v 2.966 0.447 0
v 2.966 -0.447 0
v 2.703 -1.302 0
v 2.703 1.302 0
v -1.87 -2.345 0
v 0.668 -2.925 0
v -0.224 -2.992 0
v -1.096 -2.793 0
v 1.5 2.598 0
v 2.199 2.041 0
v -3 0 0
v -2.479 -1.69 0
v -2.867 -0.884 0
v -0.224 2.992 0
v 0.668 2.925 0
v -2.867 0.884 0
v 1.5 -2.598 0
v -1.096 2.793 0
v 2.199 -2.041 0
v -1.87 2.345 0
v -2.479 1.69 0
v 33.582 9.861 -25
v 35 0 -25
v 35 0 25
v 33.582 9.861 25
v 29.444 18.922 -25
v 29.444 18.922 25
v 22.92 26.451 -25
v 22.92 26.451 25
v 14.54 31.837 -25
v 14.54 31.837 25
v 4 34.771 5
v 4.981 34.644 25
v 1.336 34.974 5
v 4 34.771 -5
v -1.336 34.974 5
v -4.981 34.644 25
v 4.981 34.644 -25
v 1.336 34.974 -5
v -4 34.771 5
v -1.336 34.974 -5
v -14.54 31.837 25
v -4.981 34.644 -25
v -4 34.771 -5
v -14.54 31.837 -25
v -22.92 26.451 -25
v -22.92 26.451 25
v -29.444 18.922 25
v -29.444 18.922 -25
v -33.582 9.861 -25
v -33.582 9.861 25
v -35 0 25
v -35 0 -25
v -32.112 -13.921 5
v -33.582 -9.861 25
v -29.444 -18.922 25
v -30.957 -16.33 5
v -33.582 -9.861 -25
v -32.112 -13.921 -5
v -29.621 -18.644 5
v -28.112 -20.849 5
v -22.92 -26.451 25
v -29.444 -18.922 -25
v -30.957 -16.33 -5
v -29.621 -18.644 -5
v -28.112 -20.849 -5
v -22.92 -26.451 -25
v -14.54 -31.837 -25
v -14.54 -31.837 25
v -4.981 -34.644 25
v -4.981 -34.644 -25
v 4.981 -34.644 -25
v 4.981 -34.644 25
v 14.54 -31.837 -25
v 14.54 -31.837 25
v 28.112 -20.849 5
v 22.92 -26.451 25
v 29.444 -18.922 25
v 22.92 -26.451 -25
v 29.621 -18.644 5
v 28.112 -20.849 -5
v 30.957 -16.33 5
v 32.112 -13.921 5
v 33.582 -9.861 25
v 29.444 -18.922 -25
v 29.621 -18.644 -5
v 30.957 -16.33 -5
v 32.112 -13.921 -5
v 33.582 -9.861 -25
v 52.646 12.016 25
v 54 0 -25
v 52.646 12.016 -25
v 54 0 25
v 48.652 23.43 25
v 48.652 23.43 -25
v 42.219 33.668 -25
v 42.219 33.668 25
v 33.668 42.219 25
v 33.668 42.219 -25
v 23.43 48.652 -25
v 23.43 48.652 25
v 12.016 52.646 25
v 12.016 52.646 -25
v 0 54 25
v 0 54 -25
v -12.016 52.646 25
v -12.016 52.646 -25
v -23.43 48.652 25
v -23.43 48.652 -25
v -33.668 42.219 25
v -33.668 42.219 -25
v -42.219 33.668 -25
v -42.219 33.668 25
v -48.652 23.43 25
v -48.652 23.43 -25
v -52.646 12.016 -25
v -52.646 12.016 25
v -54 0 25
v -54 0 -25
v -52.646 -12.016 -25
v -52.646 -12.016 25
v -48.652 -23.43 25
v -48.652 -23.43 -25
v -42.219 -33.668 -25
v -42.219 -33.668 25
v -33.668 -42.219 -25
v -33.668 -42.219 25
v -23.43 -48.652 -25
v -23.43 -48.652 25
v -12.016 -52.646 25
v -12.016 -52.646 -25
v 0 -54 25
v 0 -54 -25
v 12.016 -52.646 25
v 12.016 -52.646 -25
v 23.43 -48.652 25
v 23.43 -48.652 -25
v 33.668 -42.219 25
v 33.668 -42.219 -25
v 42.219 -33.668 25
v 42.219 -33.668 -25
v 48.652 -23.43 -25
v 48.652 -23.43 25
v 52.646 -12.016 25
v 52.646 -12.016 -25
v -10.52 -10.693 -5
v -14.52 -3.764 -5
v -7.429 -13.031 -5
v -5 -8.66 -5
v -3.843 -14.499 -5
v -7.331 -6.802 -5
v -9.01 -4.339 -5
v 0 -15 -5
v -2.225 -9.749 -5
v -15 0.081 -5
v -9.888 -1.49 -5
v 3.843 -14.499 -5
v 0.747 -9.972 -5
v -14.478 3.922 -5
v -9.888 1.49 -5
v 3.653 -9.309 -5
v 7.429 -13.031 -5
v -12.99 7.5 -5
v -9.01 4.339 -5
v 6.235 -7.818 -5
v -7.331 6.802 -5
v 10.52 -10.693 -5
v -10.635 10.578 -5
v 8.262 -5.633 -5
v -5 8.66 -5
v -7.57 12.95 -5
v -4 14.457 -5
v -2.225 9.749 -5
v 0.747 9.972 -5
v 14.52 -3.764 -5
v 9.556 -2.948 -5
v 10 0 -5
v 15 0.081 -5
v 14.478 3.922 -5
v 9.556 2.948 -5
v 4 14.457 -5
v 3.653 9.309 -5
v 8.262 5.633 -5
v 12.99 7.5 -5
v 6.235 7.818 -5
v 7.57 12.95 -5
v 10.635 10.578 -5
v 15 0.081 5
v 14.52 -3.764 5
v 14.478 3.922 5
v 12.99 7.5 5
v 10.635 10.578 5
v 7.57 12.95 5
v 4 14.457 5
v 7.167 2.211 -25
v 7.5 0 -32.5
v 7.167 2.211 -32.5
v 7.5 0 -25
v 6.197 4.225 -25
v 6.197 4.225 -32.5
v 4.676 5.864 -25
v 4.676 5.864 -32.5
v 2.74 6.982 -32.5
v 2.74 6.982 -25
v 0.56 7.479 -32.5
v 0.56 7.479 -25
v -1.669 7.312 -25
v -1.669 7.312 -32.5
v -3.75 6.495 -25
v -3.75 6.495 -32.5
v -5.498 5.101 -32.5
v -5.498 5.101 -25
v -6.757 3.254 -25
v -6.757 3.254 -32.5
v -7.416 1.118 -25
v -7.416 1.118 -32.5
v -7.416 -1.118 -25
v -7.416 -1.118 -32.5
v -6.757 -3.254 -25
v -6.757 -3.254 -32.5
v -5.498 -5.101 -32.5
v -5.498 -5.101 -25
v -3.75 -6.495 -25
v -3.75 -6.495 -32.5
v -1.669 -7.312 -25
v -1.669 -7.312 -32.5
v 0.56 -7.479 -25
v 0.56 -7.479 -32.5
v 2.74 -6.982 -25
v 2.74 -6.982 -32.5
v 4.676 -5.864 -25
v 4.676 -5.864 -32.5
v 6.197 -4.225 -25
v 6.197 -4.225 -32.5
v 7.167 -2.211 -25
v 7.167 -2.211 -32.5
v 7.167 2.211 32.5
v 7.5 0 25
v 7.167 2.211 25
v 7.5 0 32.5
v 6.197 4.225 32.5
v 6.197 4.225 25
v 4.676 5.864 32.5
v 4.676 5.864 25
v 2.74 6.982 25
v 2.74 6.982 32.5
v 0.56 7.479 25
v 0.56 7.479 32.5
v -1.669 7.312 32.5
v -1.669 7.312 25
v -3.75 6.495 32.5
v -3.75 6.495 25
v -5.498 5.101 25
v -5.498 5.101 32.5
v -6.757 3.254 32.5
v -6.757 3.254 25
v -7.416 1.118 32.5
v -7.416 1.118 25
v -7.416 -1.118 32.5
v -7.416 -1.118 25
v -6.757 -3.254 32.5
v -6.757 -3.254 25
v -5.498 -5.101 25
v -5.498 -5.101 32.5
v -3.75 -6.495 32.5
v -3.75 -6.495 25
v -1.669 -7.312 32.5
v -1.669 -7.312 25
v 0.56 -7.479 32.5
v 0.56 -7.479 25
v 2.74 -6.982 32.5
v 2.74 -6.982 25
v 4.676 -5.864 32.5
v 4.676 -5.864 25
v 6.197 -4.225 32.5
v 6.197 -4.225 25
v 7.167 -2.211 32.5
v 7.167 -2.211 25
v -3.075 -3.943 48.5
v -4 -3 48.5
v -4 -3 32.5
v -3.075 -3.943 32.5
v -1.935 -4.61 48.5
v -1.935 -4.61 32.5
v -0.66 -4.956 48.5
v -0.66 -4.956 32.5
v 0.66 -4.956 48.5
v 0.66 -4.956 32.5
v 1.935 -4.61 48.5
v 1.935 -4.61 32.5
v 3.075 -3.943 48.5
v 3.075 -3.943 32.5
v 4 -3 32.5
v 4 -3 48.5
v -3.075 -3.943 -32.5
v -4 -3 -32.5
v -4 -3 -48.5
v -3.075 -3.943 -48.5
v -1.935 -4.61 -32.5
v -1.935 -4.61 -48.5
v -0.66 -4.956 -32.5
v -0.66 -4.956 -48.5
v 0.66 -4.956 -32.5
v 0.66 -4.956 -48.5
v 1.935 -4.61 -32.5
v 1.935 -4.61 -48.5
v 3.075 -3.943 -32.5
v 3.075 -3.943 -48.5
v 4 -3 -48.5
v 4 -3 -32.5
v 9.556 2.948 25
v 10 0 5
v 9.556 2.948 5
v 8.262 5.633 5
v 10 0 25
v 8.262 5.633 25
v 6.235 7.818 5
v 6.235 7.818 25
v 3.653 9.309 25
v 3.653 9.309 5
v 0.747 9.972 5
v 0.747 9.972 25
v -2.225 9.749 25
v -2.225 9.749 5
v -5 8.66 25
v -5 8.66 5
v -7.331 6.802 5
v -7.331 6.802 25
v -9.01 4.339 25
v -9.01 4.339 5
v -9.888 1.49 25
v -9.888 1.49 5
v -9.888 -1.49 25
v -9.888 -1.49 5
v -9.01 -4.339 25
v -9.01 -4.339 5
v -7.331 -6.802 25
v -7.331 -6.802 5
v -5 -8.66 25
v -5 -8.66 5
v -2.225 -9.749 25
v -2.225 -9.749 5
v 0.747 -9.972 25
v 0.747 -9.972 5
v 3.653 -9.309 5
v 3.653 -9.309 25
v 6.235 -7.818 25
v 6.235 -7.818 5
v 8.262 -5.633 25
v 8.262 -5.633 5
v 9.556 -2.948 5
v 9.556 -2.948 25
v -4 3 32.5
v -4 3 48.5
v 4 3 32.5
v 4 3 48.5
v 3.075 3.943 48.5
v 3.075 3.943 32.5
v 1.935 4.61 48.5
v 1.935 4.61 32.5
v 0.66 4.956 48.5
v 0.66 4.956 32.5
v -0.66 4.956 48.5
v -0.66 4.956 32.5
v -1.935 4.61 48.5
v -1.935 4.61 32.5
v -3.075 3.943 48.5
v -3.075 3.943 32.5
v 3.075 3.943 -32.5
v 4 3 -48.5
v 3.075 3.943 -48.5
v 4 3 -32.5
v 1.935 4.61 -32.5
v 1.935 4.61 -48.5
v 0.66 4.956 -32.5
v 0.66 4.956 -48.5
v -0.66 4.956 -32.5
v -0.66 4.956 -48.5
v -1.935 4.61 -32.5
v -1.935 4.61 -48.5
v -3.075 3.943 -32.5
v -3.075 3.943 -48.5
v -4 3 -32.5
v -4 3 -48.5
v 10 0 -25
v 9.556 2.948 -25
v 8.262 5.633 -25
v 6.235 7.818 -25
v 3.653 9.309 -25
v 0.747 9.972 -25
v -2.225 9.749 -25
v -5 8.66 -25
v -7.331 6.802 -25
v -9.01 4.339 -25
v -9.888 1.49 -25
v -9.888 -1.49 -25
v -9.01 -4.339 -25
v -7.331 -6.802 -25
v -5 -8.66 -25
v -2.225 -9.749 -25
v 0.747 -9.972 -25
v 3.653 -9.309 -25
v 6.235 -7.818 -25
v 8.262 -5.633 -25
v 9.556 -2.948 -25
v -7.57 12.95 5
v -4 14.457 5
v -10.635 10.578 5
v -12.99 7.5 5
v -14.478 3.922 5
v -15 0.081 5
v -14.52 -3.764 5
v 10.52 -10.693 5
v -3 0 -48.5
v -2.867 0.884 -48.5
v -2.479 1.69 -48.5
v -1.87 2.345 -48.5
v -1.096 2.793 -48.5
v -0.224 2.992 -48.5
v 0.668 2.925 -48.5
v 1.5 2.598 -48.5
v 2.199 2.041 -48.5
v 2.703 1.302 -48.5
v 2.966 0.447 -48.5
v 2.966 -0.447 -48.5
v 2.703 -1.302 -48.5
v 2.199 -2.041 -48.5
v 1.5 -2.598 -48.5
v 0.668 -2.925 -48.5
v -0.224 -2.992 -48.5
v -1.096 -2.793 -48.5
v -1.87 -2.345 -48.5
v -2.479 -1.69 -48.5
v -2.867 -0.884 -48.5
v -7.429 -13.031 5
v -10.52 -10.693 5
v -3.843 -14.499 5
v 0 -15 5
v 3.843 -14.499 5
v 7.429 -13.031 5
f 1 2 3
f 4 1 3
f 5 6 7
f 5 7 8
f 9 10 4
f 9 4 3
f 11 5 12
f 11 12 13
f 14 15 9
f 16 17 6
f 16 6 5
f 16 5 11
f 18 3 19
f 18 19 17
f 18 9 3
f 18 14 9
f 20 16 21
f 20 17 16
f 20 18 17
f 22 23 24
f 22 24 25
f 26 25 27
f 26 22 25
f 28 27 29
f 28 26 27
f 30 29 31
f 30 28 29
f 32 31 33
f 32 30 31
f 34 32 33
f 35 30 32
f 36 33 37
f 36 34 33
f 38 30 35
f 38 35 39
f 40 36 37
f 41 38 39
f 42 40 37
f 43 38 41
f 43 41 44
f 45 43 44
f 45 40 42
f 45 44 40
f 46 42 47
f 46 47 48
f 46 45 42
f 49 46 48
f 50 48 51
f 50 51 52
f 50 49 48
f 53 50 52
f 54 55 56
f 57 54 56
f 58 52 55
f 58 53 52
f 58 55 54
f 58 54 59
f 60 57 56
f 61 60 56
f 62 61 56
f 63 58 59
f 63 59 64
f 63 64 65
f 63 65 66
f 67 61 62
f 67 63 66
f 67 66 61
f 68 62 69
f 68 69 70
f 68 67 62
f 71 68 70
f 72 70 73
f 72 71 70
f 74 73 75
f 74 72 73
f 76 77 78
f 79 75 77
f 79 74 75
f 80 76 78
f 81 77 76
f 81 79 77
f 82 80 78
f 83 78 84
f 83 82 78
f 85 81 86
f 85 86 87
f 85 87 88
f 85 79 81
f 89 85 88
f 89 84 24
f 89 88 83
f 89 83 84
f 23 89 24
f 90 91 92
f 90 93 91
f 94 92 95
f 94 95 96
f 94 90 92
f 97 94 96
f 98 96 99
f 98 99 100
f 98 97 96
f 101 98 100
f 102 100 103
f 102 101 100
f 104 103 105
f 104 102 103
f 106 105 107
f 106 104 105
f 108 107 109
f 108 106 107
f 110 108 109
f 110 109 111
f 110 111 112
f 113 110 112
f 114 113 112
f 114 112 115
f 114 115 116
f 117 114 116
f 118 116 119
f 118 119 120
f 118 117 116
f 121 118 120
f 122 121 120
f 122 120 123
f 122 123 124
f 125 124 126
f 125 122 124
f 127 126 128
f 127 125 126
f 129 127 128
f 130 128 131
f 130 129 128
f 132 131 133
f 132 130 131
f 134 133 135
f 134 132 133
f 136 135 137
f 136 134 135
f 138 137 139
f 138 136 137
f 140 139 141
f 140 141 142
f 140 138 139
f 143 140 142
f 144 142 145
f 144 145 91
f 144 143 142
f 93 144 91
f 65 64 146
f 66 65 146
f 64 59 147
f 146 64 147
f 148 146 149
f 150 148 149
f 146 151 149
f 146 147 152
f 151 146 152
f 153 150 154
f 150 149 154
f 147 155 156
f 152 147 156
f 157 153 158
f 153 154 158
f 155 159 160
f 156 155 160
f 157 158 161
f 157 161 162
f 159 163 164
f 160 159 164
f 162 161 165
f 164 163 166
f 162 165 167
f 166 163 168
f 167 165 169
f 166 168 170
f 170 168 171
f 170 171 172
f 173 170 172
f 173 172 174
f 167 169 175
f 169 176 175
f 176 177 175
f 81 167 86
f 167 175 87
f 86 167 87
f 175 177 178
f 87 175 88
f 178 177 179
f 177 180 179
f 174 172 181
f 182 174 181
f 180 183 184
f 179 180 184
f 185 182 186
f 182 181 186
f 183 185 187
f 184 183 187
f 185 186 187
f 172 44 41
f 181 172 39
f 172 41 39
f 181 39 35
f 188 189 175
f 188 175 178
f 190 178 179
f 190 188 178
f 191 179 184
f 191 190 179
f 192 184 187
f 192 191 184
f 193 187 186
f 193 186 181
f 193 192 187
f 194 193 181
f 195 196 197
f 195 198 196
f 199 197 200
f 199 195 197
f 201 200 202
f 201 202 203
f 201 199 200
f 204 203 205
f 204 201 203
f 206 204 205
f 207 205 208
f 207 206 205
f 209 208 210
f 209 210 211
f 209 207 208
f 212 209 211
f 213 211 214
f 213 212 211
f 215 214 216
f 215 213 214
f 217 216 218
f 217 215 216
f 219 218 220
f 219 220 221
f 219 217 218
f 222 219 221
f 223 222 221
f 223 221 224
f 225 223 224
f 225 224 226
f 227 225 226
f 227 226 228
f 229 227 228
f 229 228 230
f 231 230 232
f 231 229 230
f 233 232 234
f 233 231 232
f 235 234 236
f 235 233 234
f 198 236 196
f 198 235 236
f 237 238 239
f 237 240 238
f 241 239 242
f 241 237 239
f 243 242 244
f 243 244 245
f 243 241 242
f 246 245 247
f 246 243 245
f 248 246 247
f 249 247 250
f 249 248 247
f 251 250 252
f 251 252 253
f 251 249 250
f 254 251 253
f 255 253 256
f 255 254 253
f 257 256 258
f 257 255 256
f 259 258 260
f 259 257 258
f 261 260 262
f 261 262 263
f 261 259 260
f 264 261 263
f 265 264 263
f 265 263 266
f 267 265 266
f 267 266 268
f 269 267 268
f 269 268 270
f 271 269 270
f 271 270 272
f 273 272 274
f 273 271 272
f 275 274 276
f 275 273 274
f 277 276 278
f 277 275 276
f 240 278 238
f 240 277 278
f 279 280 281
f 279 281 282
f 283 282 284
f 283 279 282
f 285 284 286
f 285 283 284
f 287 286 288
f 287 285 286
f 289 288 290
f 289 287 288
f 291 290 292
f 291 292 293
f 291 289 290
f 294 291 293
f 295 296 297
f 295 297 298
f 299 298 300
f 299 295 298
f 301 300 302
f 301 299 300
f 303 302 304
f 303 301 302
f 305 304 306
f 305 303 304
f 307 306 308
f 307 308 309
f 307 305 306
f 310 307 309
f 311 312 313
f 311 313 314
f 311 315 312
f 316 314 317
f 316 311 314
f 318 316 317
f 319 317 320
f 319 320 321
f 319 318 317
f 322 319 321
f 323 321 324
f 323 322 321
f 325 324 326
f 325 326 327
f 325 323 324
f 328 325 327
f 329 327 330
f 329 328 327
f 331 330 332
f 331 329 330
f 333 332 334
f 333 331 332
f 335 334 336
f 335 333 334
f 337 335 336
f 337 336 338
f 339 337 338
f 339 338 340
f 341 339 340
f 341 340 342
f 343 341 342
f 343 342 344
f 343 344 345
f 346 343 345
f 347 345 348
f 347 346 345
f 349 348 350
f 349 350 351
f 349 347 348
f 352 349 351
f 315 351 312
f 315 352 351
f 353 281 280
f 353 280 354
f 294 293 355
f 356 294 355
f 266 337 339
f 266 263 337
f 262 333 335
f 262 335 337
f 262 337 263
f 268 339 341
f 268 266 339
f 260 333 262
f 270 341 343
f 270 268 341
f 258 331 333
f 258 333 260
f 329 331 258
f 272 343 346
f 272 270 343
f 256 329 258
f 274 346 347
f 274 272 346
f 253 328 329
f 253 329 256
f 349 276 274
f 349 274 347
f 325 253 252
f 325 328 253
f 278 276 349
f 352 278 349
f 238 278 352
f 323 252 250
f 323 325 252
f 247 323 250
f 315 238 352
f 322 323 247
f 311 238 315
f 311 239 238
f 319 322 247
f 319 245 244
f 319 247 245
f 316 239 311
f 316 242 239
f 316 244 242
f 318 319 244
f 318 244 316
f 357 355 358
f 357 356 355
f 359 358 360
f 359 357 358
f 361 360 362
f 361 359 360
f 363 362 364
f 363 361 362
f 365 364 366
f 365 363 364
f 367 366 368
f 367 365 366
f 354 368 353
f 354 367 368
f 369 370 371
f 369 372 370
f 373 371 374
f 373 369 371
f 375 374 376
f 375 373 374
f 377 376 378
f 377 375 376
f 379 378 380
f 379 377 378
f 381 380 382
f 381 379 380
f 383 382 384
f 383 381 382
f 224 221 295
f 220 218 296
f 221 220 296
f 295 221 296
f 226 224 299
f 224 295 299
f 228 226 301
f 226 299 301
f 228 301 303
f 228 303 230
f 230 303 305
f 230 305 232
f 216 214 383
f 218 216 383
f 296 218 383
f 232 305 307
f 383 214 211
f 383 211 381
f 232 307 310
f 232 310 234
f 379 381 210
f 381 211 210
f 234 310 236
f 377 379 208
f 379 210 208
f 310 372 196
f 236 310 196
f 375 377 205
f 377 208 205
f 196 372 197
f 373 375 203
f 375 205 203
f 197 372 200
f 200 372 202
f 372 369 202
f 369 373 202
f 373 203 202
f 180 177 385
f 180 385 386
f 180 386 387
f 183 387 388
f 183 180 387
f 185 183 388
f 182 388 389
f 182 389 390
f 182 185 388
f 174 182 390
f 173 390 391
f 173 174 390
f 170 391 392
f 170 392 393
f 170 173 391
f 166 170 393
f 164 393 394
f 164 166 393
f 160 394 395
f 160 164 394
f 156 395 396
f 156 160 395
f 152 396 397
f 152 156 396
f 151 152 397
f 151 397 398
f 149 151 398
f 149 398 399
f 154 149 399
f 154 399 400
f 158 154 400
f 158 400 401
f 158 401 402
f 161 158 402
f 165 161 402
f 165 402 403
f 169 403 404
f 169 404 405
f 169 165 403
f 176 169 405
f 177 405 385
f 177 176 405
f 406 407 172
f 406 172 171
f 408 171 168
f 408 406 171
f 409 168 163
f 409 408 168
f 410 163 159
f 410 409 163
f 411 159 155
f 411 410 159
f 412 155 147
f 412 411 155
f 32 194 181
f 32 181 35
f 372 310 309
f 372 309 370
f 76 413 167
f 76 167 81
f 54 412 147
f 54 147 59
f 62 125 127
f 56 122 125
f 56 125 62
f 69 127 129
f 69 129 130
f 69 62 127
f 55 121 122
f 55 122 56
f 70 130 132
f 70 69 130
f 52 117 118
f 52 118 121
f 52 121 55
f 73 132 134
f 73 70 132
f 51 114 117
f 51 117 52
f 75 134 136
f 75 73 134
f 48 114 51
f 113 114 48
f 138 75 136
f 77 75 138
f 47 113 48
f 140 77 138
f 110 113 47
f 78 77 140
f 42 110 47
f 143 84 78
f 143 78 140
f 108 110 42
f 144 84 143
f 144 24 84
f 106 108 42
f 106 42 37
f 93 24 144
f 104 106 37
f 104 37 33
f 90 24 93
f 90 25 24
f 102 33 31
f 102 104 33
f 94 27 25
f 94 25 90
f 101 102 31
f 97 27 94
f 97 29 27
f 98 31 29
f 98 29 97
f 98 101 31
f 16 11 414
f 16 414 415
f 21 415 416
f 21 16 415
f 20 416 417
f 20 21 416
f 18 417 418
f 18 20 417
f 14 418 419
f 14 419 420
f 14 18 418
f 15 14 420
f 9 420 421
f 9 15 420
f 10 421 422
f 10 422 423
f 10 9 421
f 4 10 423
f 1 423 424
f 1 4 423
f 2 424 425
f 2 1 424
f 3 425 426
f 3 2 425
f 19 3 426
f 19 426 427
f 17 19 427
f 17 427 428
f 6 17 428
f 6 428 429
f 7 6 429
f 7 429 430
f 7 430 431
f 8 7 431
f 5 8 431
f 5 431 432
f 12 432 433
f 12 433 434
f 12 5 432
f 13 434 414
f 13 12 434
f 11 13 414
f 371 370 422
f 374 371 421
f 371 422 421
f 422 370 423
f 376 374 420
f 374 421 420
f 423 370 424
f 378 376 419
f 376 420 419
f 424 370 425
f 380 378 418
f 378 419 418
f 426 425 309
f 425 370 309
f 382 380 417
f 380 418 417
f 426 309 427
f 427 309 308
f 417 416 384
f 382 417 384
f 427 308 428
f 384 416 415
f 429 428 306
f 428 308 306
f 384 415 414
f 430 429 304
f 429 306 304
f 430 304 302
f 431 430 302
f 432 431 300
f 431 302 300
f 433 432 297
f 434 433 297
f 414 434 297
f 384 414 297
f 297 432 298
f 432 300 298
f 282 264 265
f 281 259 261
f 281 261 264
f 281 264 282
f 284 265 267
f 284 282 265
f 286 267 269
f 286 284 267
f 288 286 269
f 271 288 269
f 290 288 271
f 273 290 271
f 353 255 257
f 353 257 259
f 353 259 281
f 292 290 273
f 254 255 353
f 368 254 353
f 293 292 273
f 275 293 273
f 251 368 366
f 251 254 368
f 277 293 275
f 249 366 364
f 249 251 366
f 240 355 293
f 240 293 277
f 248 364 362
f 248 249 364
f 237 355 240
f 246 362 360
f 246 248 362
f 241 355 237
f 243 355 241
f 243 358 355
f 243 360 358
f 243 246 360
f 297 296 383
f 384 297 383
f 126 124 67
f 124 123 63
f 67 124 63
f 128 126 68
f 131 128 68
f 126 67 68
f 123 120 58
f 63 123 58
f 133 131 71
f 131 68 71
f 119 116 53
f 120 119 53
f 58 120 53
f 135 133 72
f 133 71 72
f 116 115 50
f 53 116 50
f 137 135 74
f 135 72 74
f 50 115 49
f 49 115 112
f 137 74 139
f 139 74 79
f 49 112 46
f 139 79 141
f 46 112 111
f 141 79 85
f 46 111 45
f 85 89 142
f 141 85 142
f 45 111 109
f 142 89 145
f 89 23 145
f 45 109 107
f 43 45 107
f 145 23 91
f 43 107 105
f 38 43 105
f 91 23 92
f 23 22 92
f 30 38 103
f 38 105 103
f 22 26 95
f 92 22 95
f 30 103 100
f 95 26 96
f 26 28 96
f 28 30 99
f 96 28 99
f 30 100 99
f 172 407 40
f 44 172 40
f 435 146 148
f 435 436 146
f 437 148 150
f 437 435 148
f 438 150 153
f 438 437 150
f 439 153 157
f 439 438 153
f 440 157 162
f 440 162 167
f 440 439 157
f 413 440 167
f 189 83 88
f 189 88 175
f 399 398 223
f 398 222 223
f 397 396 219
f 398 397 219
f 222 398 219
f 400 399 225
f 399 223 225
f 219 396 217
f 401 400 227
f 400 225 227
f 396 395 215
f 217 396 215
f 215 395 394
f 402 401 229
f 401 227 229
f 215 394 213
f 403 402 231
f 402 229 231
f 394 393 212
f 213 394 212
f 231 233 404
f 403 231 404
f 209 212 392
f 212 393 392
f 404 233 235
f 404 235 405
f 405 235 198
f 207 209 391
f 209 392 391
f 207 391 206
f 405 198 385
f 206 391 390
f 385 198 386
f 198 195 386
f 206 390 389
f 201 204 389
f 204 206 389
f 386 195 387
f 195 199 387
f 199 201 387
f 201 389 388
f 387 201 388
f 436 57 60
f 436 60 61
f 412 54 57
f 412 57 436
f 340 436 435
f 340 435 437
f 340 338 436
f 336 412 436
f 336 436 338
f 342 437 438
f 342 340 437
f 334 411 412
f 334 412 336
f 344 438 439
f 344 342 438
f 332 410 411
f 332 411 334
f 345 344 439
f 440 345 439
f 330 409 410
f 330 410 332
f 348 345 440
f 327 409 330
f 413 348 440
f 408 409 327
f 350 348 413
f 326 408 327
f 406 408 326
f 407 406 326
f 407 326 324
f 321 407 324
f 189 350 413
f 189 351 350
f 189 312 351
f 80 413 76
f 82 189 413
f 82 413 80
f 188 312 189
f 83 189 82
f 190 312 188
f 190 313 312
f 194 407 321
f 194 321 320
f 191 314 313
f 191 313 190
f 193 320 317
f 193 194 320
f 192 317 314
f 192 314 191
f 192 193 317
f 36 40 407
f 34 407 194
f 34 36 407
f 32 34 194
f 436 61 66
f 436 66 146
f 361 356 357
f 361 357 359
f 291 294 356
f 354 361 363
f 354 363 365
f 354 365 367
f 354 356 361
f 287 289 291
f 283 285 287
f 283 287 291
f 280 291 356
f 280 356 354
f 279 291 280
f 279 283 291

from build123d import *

# Parameters (mm, degrees)
SKETCH1_R           = 7.5
BOSS_EXTRUDE1_DEPTH = 32.5
SKETCH3_R           = 5
BOSS_EXTRUDE3_DEPTH = 48.5
SKETCH4_R           = 54
SKETCH4_R_2         = 35
BOSS_EXTRUDE4_DEPTH = 25
SKETCH5_R           = 15
SKETCH5_W           = 8
SKETCH5_H           = 20.543167705
BOSS_EXTRUDE5_DEPTH = 5
SKETCH6_R           = 10
BOSS_EXTRUDE6_DEPTH = 25
SKETCH7_W           = 1
SKETCH7_H           = 6
CUT_EXTRUDE1_DEPTH  = 16
CUT_EXTRUDE2_START  = -48.5
SKETCH8_R           = 3
CUT_EXTRUDE2_DEPTH  = 48.5


with BuildPart() as part:
    # Sketch1 → Boss-Extrude1 (new, symmetric)
    with BuildSketch(Plane.XY):
        Circle(SKETCH1_R)
    extrude(amount=BOSS_EXTRUDE1_DEPTH, both=True)

    # Sketch3 → Boss-Extrude3 (add, symmetric)
    with BuildSketch(Plane.XY):
        with Locations(Location((0, 0, 0), (0, 0, 180))):
            Circle(SKETCH3_R)
    extrude(amount=BOSS_EXTRUDE3_DEPTH, both=True)



with BuildPart() as body_2:
    # Sketch4 → Boss-Extrude4 (new, symmetric)
    with BuildSketch(Plane.XY):
        Circle(SKETCH4_R)
        Circle(SKETCH4_R_2, mode=Mode.SUBTRACT)
    extrude(amount=BOSS_EXTRUDE4_DEPTH, both=True)


with BuildPart() as part_1:
    add(part.part)

    add(body_2.part)  # Boss-Extrude5 merges body 2
    # Sketch5 → Boss-Extrude5 (add, symmetric)
    with BuildSketch(Plane.XY):
        Circle(SKETCH5_R)
        Polygon((14.519984026, -3.764314532), (10.519984026, -10.692517763), (28.310889132, -20.964101615), (32.310889132, -14.035898385), align=None)
        with Locations((0, 24.728416147)):
            Rectangle(SKETCH5_W, SKETCH5_H)
        Polygon((-10.519984026, -10.692517763), (-14.519984026, -3.764314532), (-32.310889132, -14.035898385), (-28.310889132, -20.964101615), align=None)
    extrude(amount=BOSS_EXTRUDE5_DEPTH, both=True)

    # Sketch6 → Boss-Extrude6 (add, symmetric)
    with BuildSketch(Plane.XY):
        Circle(SKETCH6_R)
    extrude(amount=BOSS_EXTRUDE6_DEPTH, both=True)

    # Sketch7 → Cut-Extrude1 (cut)
    with BuildSketch(Plane(origin=(0, 0, -48.5), x_dir=(-1, 0, 0), z_dir=(0, 0, -1))):
        with Locations((4.5, 0)):
            Rectangle(SKETCH7_W, SKETCH7_H)
        with Locations((-4.5, 0)):
            Rectangle(SKETCH7_W, SKETCH7_H)
    cut_extrude1 = extrude(amount=-CUT_EXTRUDE1_DEPTH, mode=Mode.SUBTRACT)

    # Mirror1: Cut-Extrude1 across plane
    add(cut_extrude1.mirror(Plane.XY), mode=Mode.SUBTRACT)

    # Sketch8 → Cut-Extrude2 (cut)
    with BuildSketch(Plane(origin=(0, 0, -48.5), x_dir=(-1, 0, 0), z_dir=(0, 0, -1)).offset(CUT_EXTRUDE2_START)):
        Circle(SKETCH8_R)
    extrude(amount=CUT_EXTRUDE2_DEPTH, mode=Mode.SUBTRACT)


solid = part_1.part
